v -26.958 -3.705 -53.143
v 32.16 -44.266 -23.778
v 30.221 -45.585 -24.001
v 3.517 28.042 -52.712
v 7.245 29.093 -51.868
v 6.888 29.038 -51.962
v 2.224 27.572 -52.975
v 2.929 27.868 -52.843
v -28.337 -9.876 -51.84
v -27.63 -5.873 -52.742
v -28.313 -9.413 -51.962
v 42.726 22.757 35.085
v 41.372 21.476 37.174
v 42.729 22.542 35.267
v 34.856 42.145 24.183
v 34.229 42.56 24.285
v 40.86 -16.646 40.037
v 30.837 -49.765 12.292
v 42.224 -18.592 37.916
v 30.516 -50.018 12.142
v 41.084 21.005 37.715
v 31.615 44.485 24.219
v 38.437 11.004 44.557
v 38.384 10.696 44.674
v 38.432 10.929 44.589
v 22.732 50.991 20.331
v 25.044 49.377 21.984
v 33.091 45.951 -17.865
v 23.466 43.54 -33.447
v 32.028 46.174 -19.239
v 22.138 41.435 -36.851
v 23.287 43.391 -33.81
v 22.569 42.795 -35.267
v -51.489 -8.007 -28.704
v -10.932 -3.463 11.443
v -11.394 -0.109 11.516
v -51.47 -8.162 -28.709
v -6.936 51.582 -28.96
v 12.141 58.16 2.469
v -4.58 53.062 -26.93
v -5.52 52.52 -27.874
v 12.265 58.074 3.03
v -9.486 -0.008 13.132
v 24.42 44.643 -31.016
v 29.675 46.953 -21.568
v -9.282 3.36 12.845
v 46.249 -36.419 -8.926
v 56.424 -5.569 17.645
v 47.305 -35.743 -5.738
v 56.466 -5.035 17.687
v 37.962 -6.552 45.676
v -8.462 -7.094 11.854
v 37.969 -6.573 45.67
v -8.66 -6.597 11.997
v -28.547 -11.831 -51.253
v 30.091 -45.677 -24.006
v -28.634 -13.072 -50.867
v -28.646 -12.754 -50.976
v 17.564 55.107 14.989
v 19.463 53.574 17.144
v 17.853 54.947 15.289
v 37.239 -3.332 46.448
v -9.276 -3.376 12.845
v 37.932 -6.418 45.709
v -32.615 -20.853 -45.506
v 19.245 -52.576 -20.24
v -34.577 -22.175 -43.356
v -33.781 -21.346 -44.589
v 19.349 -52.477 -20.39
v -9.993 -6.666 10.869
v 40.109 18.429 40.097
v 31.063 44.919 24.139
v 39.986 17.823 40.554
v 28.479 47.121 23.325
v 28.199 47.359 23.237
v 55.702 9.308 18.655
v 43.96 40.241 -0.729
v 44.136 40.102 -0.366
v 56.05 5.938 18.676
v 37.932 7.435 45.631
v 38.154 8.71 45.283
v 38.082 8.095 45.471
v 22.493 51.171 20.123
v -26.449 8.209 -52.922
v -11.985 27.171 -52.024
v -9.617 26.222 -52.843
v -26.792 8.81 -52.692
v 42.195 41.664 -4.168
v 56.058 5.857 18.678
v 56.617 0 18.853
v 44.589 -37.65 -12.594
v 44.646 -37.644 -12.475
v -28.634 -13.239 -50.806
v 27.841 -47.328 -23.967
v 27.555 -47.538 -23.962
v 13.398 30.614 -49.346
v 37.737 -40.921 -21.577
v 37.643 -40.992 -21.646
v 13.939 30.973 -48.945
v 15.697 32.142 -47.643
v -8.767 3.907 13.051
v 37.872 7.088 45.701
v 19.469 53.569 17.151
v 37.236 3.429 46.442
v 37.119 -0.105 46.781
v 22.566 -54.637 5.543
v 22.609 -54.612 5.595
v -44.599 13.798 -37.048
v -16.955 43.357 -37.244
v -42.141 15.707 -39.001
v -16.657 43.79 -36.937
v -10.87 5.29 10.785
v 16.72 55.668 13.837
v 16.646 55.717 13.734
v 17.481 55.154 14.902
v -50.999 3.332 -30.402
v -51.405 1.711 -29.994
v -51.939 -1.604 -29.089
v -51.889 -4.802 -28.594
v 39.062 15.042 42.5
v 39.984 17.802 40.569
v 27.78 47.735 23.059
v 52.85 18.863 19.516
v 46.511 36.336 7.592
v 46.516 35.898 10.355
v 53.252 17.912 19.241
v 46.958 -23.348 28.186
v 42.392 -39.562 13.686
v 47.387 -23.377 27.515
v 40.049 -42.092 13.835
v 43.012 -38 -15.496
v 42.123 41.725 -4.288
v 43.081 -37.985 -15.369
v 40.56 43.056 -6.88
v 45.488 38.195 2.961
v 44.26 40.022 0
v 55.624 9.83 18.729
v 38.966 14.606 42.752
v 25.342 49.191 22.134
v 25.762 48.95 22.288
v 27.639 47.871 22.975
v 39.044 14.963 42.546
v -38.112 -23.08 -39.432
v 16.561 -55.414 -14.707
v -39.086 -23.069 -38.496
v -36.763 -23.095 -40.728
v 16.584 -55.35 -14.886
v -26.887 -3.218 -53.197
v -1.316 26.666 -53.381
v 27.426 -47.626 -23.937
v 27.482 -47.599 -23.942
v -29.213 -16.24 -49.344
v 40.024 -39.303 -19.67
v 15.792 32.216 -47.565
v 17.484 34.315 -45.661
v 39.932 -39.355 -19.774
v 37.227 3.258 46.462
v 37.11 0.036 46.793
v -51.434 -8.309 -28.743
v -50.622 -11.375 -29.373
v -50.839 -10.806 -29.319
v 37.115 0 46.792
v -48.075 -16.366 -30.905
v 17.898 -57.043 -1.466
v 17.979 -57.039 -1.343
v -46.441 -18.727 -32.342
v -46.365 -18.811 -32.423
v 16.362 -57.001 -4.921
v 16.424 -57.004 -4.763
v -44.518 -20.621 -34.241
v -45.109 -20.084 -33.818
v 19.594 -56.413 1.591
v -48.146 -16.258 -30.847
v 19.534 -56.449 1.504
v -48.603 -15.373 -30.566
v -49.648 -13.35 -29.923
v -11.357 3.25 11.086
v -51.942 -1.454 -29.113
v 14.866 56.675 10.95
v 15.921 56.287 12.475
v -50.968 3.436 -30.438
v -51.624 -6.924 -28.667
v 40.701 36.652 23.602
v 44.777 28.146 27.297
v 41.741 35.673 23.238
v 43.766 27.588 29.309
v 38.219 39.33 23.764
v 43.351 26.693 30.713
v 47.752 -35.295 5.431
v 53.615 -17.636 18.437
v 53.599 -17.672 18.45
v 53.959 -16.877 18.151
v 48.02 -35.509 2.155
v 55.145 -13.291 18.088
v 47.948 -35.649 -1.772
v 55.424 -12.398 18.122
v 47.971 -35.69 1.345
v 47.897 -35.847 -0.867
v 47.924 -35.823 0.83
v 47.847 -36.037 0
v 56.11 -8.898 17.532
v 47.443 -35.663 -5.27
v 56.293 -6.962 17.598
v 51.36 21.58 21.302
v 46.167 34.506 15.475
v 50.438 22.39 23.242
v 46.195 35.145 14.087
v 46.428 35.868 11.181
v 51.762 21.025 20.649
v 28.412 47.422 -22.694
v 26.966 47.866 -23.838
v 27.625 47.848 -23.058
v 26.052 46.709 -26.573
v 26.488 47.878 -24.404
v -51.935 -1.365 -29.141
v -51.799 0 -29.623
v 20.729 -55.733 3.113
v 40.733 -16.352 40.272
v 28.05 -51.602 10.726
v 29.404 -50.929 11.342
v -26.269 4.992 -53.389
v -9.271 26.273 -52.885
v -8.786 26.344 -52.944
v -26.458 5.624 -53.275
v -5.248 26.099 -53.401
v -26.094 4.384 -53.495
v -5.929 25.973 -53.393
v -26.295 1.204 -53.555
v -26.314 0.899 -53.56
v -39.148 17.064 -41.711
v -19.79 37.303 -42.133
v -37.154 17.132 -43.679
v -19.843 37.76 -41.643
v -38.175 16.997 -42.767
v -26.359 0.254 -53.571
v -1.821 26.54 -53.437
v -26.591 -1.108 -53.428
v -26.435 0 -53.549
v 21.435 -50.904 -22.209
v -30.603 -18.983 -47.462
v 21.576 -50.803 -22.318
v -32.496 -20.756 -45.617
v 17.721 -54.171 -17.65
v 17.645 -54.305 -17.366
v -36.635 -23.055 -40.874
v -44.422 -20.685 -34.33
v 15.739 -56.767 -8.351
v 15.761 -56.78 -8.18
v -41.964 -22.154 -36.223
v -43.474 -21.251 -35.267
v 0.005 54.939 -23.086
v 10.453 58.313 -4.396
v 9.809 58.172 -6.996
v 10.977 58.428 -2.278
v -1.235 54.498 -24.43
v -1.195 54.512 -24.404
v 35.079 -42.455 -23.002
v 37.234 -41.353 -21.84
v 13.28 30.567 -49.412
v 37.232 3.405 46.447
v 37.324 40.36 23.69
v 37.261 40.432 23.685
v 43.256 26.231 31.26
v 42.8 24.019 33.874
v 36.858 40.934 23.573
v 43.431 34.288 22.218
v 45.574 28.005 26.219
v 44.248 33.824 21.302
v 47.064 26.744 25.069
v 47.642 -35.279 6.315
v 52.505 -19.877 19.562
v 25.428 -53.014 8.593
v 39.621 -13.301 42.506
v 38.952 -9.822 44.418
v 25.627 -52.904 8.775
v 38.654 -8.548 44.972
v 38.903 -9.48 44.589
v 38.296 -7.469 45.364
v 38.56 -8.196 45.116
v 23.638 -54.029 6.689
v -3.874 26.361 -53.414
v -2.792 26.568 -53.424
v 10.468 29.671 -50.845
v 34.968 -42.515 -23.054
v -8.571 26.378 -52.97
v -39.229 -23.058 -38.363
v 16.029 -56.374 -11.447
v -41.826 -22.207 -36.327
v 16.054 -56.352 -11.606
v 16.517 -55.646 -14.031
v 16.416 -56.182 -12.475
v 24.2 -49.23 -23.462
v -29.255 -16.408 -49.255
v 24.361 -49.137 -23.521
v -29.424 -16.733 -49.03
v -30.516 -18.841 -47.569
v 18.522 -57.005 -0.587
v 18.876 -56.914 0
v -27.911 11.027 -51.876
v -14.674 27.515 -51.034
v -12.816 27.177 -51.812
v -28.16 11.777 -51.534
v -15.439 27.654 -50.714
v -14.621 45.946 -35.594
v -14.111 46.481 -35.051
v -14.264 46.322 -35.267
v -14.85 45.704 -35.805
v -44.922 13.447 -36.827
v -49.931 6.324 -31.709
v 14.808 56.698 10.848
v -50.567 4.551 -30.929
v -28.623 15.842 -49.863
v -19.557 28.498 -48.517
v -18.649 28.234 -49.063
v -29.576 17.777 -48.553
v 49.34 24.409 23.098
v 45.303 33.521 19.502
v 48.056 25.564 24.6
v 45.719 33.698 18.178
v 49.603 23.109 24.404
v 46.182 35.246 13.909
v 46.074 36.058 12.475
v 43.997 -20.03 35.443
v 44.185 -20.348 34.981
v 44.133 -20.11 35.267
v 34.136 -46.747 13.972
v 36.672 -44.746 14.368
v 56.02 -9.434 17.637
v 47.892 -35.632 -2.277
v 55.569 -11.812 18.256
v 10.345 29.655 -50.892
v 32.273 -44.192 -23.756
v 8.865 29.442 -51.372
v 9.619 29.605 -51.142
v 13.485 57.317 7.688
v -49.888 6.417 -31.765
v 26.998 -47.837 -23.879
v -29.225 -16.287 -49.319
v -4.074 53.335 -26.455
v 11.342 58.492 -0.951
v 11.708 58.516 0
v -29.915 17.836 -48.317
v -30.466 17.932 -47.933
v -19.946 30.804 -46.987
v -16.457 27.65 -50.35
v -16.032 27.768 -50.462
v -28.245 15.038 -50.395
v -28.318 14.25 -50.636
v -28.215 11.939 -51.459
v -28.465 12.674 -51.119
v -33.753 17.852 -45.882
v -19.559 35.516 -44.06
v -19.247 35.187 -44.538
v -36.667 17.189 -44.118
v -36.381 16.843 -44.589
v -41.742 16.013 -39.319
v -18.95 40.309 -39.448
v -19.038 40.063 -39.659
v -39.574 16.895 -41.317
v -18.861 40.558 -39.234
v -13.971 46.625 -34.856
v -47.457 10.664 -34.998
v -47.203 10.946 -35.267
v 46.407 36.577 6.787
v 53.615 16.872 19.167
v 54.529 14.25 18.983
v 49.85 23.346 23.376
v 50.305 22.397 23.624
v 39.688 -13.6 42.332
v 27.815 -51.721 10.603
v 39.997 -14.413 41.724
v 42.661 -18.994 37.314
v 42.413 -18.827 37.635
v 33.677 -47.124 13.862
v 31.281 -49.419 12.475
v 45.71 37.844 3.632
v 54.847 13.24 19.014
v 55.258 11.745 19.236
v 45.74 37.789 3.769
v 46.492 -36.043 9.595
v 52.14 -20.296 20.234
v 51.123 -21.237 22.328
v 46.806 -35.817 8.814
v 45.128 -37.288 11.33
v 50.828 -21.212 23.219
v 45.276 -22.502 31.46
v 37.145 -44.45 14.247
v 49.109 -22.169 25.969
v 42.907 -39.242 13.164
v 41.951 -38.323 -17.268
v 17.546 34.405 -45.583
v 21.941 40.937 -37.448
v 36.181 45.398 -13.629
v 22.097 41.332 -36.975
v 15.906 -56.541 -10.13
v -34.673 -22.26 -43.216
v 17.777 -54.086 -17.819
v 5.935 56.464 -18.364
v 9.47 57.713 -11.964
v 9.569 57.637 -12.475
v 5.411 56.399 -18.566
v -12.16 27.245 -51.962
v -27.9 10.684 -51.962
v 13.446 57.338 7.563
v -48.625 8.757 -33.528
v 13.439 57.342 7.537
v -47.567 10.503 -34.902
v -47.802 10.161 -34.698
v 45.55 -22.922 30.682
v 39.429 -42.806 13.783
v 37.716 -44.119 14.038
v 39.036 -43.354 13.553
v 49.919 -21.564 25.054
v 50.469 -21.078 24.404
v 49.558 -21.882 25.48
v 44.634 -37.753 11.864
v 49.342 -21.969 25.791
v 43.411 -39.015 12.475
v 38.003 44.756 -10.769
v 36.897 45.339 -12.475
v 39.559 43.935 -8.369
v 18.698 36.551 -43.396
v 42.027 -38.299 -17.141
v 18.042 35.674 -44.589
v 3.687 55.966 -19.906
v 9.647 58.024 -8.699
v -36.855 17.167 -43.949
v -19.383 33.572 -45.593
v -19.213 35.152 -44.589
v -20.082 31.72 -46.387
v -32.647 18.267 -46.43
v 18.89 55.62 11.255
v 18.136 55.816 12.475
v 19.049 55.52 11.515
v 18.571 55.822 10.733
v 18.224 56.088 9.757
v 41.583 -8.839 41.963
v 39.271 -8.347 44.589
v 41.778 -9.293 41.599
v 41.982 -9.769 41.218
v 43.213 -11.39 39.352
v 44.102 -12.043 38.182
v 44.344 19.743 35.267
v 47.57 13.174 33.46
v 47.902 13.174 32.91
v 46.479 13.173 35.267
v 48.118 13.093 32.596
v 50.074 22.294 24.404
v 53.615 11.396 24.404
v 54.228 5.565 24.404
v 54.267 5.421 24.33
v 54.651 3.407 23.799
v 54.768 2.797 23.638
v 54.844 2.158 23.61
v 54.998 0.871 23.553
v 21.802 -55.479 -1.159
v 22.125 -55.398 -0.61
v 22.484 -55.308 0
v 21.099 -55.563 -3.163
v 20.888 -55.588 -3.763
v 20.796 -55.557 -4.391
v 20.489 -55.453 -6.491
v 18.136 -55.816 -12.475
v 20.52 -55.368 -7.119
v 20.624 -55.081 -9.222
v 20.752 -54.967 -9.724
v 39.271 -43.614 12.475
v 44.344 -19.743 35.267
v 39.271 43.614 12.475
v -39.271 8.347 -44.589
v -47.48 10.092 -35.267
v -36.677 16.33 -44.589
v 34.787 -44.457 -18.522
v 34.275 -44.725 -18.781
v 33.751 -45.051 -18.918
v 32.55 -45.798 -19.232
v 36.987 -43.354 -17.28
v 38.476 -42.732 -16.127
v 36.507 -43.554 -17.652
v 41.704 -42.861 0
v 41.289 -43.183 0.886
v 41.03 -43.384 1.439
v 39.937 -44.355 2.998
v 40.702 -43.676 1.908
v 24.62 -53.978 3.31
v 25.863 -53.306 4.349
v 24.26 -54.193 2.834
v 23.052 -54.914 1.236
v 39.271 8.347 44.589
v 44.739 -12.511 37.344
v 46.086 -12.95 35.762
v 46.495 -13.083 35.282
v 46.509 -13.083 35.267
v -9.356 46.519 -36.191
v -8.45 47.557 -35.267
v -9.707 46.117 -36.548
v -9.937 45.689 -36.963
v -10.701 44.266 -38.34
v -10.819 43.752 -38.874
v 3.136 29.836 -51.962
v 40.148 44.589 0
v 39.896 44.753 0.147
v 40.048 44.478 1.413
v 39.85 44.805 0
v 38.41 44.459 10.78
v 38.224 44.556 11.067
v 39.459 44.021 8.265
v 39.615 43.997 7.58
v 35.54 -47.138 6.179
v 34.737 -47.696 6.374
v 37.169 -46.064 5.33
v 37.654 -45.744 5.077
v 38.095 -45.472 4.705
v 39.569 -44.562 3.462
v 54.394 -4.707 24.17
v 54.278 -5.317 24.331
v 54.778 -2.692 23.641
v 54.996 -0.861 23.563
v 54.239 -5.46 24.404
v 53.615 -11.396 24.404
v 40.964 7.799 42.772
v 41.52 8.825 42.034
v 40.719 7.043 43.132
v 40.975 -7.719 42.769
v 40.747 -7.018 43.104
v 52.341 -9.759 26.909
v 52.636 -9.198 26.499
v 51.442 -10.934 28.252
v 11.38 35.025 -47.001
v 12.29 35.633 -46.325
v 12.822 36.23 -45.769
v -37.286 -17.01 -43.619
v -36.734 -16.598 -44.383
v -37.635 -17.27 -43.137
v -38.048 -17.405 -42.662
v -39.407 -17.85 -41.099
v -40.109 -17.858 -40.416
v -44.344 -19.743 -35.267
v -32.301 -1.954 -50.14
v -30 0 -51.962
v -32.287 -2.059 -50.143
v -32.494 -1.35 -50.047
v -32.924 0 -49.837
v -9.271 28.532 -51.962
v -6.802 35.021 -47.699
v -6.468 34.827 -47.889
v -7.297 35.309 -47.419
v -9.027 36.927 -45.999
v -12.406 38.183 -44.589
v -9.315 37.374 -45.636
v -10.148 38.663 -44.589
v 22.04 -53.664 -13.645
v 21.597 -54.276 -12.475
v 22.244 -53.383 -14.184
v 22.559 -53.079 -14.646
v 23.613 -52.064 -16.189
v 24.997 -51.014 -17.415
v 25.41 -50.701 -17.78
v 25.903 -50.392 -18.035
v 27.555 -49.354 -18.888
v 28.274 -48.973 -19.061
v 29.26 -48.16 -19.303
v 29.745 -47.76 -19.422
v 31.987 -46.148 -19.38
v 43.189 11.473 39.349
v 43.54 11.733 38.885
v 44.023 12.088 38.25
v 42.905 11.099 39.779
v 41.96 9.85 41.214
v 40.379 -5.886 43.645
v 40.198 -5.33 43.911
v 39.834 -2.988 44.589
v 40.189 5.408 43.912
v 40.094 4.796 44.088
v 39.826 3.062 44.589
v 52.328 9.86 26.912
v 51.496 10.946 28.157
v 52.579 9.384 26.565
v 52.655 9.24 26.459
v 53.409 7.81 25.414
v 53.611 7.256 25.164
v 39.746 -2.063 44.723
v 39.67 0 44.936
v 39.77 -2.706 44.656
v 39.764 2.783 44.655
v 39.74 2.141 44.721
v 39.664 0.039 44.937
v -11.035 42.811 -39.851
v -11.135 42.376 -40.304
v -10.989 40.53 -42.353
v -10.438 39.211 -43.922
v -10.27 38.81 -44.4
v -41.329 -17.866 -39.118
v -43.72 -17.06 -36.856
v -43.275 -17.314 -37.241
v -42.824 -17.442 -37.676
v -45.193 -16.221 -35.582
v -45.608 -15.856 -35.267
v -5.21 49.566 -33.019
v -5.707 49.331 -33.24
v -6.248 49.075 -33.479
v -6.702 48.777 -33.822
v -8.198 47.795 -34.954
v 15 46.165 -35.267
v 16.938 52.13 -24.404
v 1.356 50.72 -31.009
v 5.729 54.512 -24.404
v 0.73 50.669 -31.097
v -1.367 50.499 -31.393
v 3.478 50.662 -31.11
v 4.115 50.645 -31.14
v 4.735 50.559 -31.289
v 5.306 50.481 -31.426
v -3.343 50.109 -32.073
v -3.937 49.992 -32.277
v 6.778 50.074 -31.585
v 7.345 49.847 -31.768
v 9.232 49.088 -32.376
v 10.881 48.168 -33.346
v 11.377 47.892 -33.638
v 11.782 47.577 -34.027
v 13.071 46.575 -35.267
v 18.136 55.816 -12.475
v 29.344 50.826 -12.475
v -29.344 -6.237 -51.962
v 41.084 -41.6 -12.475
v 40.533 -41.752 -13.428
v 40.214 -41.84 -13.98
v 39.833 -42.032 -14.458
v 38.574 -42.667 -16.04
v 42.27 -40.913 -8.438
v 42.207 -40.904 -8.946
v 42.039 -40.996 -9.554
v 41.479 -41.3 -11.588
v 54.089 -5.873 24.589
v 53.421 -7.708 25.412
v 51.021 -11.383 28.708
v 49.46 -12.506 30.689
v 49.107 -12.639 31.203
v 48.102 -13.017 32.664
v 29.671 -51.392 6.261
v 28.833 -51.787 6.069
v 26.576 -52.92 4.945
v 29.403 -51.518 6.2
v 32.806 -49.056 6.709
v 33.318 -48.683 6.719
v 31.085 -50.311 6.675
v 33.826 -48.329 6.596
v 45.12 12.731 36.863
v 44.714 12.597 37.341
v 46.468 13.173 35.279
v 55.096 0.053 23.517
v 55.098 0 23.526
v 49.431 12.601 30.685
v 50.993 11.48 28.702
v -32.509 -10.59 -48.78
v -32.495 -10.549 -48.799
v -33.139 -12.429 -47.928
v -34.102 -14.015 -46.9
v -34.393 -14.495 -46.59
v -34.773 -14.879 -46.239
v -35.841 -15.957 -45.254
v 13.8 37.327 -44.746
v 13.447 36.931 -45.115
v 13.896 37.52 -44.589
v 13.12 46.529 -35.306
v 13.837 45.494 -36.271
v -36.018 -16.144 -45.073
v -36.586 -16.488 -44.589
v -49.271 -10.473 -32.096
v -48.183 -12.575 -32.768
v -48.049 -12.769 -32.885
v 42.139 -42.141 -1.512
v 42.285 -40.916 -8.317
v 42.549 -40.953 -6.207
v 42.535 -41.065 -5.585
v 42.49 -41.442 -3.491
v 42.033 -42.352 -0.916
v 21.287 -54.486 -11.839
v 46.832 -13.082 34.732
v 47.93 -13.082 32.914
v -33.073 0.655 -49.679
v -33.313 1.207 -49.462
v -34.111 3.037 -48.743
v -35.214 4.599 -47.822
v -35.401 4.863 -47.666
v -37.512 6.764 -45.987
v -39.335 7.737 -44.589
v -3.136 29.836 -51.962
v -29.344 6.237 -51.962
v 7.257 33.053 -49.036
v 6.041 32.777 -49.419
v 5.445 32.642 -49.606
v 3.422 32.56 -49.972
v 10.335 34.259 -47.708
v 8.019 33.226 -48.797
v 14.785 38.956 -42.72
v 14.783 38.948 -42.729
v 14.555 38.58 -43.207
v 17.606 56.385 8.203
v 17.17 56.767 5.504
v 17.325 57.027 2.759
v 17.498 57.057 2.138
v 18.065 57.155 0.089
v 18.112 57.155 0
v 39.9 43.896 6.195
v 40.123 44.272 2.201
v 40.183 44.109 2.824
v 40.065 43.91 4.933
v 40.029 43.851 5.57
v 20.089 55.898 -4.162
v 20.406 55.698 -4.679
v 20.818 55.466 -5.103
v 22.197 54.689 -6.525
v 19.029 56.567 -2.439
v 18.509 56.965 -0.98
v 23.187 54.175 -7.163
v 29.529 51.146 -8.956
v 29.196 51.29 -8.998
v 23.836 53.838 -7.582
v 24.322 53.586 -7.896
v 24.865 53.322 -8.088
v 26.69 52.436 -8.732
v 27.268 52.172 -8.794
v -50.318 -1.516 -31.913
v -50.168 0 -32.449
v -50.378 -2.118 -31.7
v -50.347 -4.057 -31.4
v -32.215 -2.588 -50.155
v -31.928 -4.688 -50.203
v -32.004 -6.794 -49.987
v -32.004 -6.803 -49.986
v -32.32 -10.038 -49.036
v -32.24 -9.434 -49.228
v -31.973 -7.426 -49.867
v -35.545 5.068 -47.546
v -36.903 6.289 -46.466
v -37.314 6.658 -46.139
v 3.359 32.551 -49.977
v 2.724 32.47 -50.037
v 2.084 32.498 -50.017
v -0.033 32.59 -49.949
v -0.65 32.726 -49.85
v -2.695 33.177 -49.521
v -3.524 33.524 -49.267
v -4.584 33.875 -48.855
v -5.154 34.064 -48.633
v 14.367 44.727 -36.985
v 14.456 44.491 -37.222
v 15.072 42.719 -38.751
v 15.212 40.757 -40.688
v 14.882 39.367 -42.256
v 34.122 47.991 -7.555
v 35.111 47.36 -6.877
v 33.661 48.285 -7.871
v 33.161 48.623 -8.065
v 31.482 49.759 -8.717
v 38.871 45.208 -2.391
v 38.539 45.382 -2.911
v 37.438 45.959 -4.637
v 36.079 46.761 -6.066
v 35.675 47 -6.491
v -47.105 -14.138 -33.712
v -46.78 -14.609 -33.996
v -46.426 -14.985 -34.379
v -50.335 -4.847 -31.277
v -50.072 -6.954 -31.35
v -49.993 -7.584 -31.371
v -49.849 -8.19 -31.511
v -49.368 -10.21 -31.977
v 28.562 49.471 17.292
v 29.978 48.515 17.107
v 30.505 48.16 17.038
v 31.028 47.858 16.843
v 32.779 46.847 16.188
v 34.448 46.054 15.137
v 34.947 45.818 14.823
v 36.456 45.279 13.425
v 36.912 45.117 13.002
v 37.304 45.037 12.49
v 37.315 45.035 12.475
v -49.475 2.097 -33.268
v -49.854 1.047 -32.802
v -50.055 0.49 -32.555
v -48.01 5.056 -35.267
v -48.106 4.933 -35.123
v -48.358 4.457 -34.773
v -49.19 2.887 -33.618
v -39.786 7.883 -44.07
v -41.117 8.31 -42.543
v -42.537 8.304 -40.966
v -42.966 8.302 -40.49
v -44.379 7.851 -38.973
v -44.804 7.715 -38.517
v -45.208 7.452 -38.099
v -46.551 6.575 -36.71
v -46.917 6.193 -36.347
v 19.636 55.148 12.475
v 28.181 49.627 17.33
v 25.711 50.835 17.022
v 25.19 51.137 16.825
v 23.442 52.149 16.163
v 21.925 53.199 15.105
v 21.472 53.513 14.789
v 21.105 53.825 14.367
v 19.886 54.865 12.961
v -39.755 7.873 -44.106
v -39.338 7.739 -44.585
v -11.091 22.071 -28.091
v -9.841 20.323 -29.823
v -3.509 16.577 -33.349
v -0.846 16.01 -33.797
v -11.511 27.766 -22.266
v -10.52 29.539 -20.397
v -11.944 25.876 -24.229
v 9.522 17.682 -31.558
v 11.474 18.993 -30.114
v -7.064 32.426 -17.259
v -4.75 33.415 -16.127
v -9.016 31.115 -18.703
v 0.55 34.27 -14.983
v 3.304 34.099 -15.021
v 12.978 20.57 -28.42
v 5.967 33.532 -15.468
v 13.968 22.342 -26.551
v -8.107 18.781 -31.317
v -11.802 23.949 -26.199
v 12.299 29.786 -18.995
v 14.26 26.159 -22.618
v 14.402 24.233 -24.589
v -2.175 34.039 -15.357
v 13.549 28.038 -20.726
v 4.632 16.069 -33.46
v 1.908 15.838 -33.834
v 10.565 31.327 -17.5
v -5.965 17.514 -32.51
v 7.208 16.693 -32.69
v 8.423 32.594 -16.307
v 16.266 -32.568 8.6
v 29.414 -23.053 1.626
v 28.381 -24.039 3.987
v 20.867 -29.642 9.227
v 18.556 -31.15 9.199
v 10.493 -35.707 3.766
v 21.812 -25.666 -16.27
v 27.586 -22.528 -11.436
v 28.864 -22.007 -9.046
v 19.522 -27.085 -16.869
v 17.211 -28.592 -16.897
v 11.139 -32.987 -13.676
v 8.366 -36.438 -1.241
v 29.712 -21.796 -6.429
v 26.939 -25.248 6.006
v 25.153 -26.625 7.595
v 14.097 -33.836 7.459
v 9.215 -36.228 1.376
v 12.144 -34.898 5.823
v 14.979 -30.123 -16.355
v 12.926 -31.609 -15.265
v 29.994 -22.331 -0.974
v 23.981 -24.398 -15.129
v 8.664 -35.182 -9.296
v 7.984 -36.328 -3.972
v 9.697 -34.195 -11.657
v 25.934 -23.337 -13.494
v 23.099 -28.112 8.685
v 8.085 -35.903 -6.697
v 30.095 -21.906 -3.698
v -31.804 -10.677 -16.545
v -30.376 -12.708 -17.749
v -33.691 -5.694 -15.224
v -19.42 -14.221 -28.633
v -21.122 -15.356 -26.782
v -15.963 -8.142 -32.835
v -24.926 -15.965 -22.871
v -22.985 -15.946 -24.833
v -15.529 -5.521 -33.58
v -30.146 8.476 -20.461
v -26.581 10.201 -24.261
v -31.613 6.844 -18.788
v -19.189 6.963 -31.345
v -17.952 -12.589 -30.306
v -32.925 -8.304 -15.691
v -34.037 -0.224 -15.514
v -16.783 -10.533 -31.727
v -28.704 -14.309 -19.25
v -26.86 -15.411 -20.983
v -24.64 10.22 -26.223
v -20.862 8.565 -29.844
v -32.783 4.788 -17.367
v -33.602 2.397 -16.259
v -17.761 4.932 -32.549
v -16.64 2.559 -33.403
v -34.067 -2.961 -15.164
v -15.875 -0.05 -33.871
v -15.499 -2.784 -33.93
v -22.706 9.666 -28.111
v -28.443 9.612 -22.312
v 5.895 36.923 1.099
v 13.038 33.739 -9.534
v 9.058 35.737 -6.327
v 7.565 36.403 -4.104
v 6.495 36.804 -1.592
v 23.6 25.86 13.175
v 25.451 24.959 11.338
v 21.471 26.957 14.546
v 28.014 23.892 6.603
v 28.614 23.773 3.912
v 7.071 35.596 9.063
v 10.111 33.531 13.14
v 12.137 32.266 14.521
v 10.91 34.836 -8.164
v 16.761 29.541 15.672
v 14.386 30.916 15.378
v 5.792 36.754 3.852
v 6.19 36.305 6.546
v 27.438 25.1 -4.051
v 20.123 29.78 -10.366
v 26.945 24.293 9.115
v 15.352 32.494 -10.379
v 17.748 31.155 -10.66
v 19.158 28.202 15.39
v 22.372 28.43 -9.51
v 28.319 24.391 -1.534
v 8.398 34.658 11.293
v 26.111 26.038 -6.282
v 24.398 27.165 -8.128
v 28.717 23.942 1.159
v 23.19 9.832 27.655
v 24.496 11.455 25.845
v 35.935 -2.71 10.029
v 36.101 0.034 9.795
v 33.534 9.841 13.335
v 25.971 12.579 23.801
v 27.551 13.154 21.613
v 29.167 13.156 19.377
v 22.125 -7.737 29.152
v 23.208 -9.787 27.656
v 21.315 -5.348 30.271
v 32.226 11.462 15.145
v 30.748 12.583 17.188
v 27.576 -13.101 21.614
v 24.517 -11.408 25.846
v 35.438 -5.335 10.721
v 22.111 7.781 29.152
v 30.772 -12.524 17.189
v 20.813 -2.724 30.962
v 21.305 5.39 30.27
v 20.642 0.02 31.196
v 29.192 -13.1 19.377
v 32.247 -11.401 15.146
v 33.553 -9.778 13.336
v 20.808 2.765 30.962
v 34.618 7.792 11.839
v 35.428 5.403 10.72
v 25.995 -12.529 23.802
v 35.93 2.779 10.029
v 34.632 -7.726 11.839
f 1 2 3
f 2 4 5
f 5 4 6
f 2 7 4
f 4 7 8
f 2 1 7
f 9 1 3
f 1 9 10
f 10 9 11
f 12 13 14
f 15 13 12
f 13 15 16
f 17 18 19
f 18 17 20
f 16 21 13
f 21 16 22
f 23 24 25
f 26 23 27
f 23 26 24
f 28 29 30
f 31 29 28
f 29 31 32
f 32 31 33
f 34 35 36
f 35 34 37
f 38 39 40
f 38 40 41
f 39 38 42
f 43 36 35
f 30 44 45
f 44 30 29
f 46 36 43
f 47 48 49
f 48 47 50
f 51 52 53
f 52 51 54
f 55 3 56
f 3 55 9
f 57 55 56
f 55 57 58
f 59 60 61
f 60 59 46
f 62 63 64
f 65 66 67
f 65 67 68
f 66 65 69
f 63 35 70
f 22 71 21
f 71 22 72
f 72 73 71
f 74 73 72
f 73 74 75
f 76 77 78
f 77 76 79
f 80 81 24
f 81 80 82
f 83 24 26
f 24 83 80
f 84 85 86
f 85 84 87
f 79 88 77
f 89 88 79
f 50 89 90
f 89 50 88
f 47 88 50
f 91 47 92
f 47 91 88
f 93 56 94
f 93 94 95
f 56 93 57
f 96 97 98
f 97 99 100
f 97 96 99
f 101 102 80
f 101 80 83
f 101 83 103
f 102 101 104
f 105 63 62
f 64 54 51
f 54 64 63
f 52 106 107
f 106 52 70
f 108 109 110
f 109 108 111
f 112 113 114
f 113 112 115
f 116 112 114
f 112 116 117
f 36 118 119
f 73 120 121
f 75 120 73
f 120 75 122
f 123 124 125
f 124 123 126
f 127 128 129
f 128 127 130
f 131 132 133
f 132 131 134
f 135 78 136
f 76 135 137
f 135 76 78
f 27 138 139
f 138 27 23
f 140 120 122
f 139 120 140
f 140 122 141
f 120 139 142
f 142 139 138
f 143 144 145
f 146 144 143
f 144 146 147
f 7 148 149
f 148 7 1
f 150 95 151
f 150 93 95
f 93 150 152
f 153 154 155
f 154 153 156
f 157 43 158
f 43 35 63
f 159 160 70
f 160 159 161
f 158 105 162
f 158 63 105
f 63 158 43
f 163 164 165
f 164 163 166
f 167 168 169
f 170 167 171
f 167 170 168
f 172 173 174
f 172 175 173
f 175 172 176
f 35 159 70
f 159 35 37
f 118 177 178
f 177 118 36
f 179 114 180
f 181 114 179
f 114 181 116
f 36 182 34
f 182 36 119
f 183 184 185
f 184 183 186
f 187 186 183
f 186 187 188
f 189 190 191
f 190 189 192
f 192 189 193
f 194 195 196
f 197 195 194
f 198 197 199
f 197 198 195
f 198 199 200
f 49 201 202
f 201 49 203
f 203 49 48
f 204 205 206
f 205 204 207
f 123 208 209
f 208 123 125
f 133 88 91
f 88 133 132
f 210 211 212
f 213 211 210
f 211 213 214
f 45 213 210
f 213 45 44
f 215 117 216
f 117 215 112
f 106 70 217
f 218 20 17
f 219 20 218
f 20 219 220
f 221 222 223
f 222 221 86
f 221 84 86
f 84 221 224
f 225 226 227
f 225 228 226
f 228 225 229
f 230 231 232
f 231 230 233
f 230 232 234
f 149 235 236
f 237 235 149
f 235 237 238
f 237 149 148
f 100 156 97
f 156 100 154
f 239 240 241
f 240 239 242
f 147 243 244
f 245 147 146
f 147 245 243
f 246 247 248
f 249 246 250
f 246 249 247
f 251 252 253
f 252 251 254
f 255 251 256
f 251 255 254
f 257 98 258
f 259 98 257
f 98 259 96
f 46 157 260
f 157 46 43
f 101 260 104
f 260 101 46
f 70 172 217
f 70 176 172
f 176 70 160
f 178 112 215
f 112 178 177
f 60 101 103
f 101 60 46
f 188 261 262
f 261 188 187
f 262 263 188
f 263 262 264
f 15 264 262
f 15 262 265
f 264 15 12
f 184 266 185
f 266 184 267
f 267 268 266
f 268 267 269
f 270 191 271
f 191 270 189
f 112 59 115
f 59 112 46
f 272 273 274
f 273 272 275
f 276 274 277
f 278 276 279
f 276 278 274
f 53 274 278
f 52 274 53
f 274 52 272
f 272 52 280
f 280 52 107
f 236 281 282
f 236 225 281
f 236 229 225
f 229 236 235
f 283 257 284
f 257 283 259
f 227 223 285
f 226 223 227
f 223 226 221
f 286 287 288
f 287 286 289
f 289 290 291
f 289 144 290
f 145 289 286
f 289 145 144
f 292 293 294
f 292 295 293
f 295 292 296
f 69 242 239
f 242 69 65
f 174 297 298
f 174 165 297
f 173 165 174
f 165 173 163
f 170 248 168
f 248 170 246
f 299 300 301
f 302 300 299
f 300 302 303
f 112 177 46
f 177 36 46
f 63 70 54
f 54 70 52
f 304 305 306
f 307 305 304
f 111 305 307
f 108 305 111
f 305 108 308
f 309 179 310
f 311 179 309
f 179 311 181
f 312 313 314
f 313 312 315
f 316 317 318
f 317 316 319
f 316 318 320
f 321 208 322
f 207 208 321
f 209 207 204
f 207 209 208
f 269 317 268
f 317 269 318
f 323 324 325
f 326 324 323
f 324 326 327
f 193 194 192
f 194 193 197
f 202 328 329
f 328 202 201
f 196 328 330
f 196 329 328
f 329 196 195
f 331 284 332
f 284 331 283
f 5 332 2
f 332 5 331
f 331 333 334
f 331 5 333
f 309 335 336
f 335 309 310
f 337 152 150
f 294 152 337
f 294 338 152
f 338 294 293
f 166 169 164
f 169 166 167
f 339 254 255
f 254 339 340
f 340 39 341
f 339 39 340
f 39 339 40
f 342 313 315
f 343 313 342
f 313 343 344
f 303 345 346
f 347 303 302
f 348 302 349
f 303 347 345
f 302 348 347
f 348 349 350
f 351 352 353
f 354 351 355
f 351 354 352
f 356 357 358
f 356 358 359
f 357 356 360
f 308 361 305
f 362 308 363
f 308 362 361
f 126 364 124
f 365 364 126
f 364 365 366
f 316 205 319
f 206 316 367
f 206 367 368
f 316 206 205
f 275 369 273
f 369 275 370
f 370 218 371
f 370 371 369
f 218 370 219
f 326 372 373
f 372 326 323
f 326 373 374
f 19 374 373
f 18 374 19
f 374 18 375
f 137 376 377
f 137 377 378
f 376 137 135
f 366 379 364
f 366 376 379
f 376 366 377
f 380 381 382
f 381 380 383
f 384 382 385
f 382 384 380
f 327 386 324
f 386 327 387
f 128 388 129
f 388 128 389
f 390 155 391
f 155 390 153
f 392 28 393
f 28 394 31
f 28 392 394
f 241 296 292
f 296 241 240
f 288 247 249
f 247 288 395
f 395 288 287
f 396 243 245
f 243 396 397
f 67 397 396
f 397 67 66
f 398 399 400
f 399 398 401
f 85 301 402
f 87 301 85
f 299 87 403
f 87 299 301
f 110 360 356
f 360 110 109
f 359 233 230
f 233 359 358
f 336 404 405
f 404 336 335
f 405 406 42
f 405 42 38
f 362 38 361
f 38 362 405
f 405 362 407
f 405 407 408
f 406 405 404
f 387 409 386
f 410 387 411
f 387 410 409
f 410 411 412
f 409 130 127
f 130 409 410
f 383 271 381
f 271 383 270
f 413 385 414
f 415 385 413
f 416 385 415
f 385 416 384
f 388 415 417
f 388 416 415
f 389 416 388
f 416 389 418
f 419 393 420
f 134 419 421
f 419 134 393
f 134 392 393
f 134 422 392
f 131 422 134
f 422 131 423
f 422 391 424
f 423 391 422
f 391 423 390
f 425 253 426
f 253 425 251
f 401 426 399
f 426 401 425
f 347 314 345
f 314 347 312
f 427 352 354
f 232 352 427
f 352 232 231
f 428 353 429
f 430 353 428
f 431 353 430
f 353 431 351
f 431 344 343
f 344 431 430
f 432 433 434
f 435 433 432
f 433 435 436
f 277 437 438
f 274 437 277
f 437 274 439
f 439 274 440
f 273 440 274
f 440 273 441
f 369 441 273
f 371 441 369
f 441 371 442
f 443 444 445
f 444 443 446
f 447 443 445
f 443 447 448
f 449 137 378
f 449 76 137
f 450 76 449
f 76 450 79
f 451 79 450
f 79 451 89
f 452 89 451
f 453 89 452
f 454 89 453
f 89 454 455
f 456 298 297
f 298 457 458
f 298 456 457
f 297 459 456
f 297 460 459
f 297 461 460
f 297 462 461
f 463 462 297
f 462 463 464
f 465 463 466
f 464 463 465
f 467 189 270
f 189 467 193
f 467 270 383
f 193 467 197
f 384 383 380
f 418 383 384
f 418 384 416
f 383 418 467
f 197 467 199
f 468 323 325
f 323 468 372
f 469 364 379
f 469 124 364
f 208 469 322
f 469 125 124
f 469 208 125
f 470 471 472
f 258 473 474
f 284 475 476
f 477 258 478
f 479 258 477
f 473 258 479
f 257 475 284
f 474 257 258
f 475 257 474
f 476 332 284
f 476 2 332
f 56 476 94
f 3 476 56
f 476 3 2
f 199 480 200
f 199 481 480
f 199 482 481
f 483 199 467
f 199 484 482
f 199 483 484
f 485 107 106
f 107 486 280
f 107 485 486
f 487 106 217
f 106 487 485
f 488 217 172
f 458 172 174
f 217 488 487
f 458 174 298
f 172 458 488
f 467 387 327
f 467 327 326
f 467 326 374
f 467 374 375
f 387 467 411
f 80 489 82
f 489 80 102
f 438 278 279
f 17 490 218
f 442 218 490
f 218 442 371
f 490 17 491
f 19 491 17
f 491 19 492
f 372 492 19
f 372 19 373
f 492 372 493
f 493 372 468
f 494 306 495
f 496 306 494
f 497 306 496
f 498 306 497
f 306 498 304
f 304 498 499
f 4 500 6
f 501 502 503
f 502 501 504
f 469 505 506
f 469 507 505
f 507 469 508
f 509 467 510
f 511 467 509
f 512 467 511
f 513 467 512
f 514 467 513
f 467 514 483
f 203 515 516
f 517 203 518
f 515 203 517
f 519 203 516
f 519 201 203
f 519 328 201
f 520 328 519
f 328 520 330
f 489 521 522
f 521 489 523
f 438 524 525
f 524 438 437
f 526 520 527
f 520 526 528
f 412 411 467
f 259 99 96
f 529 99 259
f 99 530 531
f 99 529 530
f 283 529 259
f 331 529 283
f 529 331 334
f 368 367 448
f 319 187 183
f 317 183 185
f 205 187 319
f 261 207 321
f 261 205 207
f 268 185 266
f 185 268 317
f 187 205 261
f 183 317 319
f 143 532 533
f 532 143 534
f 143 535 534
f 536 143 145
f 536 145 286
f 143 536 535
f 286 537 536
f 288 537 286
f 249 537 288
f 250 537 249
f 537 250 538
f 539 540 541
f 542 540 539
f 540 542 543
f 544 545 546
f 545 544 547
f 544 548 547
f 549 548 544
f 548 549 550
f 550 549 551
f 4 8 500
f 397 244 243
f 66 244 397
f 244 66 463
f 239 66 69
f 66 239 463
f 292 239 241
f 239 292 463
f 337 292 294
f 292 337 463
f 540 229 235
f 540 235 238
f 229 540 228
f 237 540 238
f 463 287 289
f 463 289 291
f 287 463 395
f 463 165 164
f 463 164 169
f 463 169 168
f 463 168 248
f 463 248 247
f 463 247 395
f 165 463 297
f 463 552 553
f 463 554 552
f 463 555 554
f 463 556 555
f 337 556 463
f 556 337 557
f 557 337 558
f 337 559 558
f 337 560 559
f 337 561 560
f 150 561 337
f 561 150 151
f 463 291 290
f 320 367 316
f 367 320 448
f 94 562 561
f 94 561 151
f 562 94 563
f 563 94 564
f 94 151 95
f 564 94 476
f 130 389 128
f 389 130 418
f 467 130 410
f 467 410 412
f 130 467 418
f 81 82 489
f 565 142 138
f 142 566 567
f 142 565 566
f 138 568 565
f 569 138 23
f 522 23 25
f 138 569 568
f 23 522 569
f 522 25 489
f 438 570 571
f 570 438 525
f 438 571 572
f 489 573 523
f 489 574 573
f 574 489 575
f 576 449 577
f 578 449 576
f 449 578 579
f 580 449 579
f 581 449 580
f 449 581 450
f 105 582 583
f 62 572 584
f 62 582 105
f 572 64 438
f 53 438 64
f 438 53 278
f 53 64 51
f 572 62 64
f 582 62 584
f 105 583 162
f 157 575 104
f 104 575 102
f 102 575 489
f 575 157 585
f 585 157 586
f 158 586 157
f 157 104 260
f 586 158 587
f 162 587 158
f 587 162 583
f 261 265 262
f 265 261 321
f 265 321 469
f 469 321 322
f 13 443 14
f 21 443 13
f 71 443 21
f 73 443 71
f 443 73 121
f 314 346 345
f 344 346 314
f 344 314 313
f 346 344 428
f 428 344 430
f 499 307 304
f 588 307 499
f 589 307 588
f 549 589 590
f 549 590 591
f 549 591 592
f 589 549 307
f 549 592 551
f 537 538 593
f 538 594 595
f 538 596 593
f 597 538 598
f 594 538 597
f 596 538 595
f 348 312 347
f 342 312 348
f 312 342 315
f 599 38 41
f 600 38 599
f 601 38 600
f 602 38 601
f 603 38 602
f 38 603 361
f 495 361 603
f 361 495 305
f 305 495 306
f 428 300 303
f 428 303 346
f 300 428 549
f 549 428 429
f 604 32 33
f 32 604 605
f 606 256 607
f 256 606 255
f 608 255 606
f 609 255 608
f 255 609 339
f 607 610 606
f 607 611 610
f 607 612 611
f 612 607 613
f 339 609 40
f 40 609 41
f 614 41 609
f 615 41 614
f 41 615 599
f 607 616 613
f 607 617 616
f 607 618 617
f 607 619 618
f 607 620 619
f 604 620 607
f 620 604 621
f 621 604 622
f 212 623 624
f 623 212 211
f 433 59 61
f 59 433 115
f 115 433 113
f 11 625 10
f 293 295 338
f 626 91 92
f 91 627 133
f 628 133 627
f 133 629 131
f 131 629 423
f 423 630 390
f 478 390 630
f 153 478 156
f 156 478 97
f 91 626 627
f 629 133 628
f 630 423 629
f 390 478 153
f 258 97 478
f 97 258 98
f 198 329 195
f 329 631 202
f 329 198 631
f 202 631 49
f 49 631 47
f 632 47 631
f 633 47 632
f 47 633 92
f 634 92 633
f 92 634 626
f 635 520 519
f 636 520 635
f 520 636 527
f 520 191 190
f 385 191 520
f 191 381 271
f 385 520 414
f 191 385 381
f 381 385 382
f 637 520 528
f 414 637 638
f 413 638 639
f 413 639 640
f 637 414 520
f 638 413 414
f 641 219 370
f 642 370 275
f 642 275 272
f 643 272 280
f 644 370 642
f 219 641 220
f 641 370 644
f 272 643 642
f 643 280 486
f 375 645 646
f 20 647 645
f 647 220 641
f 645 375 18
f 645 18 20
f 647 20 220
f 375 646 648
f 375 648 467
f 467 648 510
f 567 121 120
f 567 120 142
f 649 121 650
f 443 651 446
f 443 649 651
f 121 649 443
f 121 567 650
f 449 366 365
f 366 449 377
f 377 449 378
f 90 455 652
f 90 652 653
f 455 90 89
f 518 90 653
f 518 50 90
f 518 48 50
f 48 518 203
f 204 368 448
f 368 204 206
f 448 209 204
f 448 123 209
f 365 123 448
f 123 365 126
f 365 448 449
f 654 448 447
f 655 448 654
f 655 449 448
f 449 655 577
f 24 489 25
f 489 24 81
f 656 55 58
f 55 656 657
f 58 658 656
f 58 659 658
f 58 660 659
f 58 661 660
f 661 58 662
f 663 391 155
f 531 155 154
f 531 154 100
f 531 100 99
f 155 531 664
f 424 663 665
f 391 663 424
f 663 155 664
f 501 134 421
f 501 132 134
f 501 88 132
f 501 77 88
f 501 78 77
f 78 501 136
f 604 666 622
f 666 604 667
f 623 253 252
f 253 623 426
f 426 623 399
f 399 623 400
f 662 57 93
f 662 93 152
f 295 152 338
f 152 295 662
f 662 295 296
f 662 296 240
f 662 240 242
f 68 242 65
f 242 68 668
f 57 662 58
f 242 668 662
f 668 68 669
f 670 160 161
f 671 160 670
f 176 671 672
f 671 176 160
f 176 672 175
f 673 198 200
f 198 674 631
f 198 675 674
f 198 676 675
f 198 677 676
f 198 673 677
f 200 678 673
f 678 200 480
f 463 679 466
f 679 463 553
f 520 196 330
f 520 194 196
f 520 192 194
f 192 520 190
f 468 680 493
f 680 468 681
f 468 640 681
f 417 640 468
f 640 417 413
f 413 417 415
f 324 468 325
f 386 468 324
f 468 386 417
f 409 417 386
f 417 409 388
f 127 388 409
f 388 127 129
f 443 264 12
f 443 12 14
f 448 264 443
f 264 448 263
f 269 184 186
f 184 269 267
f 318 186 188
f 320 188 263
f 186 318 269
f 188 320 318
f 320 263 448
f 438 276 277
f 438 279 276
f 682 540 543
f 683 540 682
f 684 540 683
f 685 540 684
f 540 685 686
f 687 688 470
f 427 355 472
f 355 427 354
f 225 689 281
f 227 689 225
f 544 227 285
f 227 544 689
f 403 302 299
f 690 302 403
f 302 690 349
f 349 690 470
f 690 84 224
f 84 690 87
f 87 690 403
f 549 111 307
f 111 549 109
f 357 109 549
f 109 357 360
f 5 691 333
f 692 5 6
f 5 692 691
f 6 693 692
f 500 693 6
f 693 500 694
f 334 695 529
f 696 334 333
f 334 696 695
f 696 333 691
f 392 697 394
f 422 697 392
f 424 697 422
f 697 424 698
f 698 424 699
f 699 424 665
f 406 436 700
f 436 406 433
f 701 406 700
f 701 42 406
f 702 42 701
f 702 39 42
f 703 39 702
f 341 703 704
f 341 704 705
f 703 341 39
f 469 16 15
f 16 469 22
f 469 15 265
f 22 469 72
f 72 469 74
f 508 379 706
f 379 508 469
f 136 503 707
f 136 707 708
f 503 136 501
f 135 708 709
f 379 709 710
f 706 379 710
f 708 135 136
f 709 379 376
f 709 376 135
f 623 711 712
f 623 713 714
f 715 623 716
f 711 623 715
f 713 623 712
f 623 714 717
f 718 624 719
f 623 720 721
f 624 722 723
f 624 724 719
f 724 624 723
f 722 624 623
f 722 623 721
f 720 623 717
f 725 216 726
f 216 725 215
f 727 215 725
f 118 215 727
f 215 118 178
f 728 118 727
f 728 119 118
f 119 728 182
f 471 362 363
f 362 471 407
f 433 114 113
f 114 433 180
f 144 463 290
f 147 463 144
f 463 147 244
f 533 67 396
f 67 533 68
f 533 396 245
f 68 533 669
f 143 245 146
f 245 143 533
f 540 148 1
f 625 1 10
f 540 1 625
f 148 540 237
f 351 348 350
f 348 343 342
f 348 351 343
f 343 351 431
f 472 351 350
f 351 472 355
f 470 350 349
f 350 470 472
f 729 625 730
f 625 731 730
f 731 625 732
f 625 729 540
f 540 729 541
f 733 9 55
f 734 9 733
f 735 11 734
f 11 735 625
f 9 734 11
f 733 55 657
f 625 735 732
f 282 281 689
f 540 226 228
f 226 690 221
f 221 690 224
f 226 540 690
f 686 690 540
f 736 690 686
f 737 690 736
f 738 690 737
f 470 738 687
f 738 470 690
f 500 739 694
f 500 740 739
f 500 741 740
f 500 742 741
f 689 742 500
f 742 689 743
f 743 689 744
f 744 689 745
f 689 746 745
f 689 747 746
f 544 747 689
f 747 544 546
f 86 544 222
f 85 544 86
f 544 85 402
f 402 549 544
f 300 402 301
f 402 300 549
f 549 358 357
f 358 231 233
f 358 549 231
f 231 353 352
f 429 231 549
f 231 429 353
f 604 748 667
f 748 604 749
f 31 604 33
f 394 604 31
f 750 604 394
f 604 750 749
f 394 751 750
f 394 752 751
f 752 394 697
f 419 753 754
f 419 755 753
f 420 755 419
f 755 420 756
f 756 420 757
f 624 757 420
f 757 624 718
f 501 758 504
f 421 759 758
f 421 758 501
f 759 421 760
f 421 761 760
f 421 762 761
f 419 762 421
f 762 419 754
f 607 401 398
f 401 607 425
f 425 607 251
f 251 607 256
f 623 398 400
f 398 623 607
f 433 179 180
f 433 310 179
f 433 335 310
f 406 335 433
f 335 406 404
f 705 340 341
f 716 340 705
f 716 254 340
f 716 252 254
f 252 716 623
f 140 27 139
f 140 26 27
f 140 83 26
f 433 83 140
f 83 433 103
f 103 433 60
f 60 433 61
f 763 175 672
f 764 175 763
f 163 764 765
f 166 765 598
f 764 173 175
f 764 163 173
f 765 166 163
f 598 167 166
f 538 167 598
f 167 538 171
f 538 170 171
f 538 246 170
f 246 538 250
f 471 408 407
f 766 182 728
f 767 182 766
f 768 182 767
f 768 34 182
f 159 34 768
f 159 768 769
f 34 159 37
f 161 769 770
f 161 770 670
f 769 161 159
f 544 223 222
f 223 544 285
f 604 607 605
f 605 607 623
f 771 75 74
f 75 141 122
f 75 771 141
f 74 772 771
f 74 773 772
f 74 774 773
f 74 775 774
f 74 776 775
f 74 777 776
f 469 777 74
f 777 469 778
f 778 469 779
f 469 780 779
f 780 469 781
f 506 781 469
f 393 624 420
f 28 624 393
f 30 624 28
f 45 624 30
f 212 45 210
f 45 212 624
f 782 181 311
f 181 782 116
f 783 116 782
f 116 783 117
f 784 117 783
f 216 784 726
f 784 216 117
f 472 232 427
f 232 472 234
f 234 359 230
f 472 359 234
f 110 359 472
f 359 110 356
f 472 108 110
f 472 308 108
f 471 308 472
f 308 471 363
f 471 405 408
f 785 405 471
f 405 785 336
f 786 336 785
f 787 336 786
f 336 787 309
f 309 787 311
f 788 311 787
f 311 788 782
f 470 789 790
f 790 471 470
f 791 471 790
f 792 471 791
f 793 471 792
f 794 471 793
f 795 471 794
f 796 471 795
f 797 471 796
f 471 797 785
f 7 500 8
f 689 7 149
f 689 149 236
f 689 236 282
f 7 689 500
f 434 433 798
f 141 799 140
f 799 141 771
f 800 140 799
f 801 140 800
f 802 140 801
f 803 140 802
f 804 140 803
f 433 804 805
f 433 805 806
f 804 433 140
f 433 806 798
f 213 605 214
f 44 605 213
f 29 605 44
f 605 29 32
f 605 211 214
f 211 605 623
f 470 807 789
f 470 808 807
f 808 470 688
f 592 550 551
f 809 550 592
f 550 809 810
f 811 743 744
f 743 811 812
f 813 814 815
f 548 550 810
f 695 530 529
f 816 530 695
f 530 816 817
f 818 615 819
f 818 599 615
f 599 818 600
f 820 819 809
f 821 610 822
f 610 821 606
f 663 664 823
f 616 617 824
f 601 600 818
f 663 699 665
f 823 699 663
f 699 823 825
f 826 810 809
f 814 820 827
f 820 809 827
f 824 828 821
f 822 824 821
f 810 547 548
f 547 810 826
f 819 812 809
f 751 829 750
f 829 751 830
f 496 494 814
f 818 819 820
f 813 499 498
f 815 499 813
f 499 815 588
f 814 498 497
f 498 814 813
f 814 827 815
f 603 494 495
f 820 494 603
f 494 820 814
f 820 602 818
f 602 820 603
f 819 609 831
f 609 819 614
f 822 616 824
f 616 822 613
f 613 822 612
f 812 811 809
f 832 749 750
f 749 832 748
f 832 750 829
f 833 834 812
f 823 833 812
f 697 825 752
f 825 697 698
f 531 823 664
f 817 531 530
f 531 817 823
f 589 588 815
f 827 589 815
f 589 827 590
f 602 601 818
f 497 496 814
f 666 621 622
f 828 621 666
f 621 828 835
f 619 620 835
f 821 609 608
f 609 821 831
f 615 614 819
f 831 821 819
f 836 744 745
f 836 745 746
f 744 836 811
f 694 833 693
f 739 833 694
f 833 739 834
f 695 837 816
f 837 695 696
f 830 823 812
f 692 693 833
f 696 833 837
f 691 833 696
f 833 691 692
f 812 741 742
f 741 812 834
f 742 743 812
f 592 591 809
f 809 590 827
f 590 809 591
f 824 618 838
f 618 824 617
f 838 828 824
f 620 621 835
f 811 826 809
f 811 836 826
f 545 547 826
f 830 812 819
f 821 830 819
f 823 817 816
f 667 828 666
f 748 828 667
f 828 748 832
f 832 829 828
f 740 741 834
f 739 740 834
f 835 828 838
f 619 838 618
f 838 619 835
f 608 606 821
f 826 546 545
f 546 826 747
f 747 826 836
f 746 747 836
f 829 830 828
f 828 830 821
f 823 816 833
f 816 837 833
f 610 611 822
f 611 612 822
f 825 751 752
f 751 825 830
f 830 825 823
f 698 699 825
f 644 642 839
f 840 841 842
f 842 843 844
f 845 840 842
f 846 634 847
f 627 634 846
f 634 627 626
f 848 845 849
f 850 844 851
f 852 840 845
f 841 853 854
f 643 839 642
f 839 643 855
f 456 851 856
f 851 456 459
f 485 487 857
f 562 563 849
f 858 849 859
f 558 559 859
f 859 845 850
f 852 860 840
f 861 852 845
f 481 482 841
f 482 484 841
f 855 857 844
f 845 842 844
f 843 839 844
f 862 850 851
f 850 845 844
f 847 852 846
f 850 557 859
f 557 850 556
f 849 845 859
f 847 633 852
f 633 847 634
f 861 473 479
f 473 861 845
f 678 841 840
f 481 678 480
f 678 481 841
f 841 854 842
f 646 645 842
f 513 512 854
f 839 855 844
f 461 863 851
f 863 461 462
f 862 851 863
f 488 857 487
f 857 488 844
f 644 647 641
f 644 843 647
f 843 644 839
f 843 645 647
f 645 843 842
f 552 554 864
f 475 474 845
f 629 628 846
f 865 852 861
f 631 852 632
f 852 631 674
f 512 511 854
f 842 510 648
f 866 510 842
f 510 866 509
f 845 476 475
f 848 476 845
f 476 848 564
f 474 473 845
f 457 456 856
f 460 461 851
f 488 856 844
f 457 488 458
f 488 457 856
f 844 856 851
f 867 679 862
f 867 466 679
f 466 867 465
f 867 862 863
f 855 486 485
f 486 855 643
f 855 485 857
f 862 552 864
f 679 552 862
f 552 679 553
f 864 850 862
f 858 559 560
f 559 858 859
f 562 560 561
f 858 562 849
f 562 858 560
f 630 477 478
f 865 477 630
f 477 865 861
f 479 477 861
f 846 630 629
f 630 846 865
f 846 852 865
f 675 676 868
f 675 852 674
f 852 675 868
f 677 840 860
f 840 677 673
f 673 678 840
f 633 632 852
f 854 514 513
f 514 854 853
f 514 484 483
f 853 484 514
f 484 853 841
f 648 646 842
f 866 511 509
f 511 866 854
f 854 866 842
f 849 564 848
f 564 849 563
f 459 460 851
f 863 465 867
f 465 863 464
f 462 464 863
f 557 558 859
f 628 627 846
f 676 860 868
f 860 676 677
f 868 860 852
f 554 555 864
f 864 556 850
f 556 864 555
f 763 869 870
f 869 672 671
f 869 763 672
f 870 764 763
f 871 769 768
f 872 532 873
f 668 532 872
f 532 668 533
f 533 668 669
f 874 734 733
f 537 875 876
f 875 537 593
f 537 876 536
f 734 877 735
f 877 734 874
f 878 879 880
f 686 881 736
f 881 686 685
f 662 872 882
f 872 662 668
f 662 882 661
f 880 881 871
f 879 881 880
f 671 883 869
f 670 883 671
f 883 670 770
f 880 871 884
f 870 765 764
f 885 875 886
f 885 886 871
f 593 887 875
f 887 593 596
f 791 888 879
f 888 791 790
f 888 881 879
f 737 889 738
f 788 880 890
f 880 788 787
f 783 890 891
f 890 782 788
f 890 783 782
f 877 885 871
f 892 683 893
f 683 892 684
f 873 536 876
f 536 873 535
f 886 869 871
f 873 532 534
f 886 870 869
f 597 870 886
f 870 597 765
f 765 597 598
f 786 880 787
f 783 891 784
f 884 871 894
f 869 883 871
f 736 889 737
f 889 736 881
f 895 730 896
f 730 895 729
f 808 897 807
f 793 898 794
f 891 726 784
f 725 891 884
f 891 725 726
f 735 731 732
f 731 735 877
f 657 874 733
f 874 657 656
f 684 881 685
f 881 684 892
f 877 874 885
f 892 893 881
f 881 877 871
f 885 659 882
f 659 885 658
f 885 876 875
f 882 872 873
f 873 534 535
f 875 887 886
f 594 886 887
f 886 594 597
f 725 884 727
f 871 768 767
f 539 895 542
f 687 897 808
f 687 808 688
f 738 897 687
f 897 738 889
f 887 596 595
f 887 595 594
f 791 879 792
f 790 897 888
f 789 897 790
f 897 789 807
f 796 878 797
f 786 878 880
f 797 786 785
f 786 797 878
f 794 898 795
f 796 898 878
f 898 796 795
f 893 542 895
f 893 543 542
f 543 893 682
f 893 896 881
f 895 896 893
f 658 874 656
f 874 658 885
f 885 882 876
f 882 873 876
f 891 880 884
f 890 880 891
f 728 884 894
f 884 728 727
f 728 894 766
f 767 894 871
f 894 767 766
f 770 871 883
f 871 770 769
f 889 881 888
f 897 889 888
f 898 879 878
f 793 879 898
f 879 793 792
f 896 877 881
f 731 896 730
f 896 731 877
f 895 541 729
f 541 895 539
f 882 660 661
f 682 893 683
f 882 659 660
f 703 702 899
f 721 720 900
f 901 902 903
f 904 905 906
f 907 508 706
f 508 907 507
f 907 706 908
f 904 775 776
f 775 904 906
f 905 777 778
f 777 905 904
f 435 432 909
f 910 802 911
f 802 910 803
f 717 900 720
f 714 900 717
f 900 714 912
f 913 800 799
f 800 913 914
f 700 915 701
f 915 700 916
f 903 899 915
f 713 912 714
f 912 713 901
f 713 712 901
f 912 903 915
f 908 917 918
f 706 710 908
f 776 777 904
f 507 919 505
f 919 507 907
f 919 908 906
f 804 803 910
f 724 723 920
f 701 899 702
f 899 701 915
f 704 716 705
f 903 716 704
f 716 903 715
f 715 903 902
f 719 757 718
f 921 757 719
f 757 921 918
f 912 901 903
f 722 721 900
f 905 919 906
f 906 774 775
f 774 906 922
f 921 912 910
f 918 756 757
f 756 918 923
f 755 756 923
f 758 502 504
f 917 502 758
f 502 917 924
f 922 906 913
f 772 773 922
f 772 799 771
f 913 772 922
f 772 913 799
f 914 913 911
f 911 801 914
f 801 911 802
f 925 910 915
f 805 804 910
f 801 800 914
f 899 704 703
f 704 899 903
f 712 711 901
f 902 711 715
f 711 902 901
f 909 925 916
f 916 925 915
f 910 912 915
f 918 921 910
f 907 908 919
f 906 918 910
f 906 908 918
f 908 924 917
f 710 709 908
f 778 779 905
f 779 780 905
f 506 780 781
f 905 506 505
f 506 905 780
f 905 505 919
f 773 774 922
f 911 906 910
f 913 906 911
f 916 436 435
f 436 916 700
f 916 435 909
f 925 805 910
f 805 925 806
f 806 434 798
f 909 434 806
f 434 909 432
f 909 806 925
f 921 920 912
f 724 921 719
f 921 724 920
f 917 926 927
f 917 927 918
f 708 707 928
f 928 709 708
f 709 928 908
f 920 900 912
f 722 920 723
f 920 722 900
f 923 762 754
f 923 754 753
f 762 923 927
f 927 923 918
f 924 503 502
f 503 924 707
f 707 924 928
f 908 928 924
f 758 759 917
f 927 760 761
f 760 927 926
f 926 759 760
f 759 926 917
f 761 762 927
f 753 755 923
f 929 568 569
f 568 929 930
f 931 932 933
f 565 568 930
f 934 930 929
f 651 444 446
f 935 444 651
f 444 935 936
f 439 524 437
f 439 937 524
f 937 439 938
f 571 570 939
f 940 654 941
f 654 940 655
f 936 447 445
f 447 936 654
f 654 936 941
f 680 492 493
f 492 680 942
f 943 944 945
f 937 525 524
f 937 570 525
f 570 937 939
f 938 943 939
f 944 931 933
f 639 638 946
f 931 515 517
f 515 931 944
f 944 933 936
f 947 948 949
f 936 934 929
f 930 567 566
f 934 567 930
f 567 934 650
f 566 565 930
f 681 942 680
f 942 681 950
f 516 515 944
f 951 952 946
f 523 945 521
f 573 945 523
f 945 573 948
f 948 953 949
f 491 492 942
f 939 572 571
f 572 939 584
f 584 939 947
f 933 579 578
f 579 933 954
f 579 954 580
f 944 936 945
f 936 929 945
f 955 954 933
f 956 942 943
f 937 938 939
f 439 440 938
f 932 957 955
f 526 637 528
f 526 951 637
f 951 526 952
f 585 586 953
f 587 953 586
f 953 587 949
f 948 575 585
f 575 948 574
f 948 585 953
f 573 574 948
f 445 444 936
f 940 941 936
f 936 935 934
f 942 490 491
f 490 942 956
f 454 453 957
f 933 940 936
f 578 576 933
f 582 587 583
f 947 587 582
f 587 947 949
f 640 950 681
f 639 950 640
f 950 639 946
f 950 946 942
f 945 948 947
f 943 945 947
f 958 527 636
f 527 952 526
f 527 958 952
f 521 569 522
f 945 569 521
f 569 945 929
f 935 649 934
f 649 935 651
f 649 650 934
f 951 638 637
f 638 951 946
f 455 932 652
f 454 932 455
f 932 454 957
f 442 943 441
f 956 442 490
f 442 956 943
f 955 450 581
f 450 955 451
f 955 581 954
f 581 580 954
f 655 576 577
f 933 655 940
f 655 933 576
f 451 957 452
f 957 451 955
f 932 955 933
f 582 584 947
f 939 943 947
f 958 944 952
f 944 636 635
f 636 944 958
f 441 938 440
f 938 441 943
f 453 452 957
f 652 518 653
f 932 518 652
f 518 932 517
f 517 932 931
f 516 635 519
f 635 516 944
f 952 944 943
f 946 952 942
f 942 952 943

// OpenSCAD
difference() {
	intersection() {
		hull() {
			rotate(a = -118.9051365199, v = [-0.4336068963, 0.7604915073, 0.0000000000]) {
				rotate(a = -90.0000000000, v = [0.1305261922, 0.9914448614, -0.0000000000]) {
					cylinder(h = 60, r = 16.2000000000);
				}
			}
			rotate(a = -118.9051365199, v = [-0.4336068963, 0.7604915073, 0.0000000000]) {
				rotate(a = -90.0000000000, v = [-0.9238795325, -0.3826834324, 0.0000000000]) {
					cylinder(h = 60, r = 16.2000000000);
				}
			}
			rotate(a = -118.9051365199, v = [-0.4336068963, 0.7604915073, 0.0000000000]) {
				rotate(a = -24.0657434263, v = [0.0956376174, 0.3964110704, -0.0000000000]) {
					cylinder(h = 60, r = 16.2000000000);
				}
			}
			rotate(a = -118.9051365199, v = [-0.4336068963, 0.7604915073, 0.0000000000]) {
				rotate(a = -141.7661142776, v = [0.2679213795, 0.5578727405, -0.0000000000]) {
					cylinder(h = 60, r = 16.2000000000);
				}
			}
			rotate(a = -118.9051365199, v = [-0.4336068963, 0.7604915073, 0.0000000000]) {
				rotate(a = -154.1384175201, v = [-0.2629773042, -0.3480116253, 0.0000000000]) {
					cylinder(h = 60, r = 16.2000000000);
				}
			}
		}
		sphere(r = 60);
	}
	union() {
		rotate(a = -118.9051365199, v = [-0.4336068963, 0.7604915073, 0.0000000000]) {
			rotate(a = -90.0000000000, v = [0.1305261922, 0.9914448614, -0.0000000000]) {
				translate(v = [0, 0, 35]) {
					cylinder(h = 100, r = 13.2000000000);
				}
			}
		}
		rotate(a = -118.9051365199, v = [-0.4336068963, 0.7604915073, 0.0000000000]) {
			rotate(a = -90.0000000000, v = [-0.9238795325, -0.3826834324, 0.0000000000]) {
				translate(v = [0, 0, 35]) {
					cylinder(h = 100, r = 13.2000000000);
				}
			}
		}
		rotate(a = -118.9051365199, v = [-0.4336068963, 0.7604915073, 0.0000000000]) {
			rotate(a = -24.0657434263, v = [0.0956376174, 0.3964110704, -0.0000000000]) {
				translate(v = [0, 0, 35]) {
					cylinder(h = 100, r = 13.2000000000);
				}
			}
		}
		rotate(a = -118.9051365199, v = [-0.4336068963, 0.7604915073, 0.0000000000]) {
			rotate(a = -141.7661142776, v = [0.2679213795, 0.5578727405, -0.0000000000]) {
				translate(v = [0, 0, 35]) {
					cylinder(h = 100, r = 13.2000000000);
				}
			}
		}
		rotate(a = -118.9051365199, v = [-0.4336068963, 0.7604915073, 0.0000000000]) {
			rotate(a = -154.1384175201, v = [-0.2629773042, -0.3480116253, 0.0000000000]) {
				translate(v = [0, 0, 35]) {
					cylinder(h = 100, r = 13.2000000000);
				}
			}
		}
	}
}
